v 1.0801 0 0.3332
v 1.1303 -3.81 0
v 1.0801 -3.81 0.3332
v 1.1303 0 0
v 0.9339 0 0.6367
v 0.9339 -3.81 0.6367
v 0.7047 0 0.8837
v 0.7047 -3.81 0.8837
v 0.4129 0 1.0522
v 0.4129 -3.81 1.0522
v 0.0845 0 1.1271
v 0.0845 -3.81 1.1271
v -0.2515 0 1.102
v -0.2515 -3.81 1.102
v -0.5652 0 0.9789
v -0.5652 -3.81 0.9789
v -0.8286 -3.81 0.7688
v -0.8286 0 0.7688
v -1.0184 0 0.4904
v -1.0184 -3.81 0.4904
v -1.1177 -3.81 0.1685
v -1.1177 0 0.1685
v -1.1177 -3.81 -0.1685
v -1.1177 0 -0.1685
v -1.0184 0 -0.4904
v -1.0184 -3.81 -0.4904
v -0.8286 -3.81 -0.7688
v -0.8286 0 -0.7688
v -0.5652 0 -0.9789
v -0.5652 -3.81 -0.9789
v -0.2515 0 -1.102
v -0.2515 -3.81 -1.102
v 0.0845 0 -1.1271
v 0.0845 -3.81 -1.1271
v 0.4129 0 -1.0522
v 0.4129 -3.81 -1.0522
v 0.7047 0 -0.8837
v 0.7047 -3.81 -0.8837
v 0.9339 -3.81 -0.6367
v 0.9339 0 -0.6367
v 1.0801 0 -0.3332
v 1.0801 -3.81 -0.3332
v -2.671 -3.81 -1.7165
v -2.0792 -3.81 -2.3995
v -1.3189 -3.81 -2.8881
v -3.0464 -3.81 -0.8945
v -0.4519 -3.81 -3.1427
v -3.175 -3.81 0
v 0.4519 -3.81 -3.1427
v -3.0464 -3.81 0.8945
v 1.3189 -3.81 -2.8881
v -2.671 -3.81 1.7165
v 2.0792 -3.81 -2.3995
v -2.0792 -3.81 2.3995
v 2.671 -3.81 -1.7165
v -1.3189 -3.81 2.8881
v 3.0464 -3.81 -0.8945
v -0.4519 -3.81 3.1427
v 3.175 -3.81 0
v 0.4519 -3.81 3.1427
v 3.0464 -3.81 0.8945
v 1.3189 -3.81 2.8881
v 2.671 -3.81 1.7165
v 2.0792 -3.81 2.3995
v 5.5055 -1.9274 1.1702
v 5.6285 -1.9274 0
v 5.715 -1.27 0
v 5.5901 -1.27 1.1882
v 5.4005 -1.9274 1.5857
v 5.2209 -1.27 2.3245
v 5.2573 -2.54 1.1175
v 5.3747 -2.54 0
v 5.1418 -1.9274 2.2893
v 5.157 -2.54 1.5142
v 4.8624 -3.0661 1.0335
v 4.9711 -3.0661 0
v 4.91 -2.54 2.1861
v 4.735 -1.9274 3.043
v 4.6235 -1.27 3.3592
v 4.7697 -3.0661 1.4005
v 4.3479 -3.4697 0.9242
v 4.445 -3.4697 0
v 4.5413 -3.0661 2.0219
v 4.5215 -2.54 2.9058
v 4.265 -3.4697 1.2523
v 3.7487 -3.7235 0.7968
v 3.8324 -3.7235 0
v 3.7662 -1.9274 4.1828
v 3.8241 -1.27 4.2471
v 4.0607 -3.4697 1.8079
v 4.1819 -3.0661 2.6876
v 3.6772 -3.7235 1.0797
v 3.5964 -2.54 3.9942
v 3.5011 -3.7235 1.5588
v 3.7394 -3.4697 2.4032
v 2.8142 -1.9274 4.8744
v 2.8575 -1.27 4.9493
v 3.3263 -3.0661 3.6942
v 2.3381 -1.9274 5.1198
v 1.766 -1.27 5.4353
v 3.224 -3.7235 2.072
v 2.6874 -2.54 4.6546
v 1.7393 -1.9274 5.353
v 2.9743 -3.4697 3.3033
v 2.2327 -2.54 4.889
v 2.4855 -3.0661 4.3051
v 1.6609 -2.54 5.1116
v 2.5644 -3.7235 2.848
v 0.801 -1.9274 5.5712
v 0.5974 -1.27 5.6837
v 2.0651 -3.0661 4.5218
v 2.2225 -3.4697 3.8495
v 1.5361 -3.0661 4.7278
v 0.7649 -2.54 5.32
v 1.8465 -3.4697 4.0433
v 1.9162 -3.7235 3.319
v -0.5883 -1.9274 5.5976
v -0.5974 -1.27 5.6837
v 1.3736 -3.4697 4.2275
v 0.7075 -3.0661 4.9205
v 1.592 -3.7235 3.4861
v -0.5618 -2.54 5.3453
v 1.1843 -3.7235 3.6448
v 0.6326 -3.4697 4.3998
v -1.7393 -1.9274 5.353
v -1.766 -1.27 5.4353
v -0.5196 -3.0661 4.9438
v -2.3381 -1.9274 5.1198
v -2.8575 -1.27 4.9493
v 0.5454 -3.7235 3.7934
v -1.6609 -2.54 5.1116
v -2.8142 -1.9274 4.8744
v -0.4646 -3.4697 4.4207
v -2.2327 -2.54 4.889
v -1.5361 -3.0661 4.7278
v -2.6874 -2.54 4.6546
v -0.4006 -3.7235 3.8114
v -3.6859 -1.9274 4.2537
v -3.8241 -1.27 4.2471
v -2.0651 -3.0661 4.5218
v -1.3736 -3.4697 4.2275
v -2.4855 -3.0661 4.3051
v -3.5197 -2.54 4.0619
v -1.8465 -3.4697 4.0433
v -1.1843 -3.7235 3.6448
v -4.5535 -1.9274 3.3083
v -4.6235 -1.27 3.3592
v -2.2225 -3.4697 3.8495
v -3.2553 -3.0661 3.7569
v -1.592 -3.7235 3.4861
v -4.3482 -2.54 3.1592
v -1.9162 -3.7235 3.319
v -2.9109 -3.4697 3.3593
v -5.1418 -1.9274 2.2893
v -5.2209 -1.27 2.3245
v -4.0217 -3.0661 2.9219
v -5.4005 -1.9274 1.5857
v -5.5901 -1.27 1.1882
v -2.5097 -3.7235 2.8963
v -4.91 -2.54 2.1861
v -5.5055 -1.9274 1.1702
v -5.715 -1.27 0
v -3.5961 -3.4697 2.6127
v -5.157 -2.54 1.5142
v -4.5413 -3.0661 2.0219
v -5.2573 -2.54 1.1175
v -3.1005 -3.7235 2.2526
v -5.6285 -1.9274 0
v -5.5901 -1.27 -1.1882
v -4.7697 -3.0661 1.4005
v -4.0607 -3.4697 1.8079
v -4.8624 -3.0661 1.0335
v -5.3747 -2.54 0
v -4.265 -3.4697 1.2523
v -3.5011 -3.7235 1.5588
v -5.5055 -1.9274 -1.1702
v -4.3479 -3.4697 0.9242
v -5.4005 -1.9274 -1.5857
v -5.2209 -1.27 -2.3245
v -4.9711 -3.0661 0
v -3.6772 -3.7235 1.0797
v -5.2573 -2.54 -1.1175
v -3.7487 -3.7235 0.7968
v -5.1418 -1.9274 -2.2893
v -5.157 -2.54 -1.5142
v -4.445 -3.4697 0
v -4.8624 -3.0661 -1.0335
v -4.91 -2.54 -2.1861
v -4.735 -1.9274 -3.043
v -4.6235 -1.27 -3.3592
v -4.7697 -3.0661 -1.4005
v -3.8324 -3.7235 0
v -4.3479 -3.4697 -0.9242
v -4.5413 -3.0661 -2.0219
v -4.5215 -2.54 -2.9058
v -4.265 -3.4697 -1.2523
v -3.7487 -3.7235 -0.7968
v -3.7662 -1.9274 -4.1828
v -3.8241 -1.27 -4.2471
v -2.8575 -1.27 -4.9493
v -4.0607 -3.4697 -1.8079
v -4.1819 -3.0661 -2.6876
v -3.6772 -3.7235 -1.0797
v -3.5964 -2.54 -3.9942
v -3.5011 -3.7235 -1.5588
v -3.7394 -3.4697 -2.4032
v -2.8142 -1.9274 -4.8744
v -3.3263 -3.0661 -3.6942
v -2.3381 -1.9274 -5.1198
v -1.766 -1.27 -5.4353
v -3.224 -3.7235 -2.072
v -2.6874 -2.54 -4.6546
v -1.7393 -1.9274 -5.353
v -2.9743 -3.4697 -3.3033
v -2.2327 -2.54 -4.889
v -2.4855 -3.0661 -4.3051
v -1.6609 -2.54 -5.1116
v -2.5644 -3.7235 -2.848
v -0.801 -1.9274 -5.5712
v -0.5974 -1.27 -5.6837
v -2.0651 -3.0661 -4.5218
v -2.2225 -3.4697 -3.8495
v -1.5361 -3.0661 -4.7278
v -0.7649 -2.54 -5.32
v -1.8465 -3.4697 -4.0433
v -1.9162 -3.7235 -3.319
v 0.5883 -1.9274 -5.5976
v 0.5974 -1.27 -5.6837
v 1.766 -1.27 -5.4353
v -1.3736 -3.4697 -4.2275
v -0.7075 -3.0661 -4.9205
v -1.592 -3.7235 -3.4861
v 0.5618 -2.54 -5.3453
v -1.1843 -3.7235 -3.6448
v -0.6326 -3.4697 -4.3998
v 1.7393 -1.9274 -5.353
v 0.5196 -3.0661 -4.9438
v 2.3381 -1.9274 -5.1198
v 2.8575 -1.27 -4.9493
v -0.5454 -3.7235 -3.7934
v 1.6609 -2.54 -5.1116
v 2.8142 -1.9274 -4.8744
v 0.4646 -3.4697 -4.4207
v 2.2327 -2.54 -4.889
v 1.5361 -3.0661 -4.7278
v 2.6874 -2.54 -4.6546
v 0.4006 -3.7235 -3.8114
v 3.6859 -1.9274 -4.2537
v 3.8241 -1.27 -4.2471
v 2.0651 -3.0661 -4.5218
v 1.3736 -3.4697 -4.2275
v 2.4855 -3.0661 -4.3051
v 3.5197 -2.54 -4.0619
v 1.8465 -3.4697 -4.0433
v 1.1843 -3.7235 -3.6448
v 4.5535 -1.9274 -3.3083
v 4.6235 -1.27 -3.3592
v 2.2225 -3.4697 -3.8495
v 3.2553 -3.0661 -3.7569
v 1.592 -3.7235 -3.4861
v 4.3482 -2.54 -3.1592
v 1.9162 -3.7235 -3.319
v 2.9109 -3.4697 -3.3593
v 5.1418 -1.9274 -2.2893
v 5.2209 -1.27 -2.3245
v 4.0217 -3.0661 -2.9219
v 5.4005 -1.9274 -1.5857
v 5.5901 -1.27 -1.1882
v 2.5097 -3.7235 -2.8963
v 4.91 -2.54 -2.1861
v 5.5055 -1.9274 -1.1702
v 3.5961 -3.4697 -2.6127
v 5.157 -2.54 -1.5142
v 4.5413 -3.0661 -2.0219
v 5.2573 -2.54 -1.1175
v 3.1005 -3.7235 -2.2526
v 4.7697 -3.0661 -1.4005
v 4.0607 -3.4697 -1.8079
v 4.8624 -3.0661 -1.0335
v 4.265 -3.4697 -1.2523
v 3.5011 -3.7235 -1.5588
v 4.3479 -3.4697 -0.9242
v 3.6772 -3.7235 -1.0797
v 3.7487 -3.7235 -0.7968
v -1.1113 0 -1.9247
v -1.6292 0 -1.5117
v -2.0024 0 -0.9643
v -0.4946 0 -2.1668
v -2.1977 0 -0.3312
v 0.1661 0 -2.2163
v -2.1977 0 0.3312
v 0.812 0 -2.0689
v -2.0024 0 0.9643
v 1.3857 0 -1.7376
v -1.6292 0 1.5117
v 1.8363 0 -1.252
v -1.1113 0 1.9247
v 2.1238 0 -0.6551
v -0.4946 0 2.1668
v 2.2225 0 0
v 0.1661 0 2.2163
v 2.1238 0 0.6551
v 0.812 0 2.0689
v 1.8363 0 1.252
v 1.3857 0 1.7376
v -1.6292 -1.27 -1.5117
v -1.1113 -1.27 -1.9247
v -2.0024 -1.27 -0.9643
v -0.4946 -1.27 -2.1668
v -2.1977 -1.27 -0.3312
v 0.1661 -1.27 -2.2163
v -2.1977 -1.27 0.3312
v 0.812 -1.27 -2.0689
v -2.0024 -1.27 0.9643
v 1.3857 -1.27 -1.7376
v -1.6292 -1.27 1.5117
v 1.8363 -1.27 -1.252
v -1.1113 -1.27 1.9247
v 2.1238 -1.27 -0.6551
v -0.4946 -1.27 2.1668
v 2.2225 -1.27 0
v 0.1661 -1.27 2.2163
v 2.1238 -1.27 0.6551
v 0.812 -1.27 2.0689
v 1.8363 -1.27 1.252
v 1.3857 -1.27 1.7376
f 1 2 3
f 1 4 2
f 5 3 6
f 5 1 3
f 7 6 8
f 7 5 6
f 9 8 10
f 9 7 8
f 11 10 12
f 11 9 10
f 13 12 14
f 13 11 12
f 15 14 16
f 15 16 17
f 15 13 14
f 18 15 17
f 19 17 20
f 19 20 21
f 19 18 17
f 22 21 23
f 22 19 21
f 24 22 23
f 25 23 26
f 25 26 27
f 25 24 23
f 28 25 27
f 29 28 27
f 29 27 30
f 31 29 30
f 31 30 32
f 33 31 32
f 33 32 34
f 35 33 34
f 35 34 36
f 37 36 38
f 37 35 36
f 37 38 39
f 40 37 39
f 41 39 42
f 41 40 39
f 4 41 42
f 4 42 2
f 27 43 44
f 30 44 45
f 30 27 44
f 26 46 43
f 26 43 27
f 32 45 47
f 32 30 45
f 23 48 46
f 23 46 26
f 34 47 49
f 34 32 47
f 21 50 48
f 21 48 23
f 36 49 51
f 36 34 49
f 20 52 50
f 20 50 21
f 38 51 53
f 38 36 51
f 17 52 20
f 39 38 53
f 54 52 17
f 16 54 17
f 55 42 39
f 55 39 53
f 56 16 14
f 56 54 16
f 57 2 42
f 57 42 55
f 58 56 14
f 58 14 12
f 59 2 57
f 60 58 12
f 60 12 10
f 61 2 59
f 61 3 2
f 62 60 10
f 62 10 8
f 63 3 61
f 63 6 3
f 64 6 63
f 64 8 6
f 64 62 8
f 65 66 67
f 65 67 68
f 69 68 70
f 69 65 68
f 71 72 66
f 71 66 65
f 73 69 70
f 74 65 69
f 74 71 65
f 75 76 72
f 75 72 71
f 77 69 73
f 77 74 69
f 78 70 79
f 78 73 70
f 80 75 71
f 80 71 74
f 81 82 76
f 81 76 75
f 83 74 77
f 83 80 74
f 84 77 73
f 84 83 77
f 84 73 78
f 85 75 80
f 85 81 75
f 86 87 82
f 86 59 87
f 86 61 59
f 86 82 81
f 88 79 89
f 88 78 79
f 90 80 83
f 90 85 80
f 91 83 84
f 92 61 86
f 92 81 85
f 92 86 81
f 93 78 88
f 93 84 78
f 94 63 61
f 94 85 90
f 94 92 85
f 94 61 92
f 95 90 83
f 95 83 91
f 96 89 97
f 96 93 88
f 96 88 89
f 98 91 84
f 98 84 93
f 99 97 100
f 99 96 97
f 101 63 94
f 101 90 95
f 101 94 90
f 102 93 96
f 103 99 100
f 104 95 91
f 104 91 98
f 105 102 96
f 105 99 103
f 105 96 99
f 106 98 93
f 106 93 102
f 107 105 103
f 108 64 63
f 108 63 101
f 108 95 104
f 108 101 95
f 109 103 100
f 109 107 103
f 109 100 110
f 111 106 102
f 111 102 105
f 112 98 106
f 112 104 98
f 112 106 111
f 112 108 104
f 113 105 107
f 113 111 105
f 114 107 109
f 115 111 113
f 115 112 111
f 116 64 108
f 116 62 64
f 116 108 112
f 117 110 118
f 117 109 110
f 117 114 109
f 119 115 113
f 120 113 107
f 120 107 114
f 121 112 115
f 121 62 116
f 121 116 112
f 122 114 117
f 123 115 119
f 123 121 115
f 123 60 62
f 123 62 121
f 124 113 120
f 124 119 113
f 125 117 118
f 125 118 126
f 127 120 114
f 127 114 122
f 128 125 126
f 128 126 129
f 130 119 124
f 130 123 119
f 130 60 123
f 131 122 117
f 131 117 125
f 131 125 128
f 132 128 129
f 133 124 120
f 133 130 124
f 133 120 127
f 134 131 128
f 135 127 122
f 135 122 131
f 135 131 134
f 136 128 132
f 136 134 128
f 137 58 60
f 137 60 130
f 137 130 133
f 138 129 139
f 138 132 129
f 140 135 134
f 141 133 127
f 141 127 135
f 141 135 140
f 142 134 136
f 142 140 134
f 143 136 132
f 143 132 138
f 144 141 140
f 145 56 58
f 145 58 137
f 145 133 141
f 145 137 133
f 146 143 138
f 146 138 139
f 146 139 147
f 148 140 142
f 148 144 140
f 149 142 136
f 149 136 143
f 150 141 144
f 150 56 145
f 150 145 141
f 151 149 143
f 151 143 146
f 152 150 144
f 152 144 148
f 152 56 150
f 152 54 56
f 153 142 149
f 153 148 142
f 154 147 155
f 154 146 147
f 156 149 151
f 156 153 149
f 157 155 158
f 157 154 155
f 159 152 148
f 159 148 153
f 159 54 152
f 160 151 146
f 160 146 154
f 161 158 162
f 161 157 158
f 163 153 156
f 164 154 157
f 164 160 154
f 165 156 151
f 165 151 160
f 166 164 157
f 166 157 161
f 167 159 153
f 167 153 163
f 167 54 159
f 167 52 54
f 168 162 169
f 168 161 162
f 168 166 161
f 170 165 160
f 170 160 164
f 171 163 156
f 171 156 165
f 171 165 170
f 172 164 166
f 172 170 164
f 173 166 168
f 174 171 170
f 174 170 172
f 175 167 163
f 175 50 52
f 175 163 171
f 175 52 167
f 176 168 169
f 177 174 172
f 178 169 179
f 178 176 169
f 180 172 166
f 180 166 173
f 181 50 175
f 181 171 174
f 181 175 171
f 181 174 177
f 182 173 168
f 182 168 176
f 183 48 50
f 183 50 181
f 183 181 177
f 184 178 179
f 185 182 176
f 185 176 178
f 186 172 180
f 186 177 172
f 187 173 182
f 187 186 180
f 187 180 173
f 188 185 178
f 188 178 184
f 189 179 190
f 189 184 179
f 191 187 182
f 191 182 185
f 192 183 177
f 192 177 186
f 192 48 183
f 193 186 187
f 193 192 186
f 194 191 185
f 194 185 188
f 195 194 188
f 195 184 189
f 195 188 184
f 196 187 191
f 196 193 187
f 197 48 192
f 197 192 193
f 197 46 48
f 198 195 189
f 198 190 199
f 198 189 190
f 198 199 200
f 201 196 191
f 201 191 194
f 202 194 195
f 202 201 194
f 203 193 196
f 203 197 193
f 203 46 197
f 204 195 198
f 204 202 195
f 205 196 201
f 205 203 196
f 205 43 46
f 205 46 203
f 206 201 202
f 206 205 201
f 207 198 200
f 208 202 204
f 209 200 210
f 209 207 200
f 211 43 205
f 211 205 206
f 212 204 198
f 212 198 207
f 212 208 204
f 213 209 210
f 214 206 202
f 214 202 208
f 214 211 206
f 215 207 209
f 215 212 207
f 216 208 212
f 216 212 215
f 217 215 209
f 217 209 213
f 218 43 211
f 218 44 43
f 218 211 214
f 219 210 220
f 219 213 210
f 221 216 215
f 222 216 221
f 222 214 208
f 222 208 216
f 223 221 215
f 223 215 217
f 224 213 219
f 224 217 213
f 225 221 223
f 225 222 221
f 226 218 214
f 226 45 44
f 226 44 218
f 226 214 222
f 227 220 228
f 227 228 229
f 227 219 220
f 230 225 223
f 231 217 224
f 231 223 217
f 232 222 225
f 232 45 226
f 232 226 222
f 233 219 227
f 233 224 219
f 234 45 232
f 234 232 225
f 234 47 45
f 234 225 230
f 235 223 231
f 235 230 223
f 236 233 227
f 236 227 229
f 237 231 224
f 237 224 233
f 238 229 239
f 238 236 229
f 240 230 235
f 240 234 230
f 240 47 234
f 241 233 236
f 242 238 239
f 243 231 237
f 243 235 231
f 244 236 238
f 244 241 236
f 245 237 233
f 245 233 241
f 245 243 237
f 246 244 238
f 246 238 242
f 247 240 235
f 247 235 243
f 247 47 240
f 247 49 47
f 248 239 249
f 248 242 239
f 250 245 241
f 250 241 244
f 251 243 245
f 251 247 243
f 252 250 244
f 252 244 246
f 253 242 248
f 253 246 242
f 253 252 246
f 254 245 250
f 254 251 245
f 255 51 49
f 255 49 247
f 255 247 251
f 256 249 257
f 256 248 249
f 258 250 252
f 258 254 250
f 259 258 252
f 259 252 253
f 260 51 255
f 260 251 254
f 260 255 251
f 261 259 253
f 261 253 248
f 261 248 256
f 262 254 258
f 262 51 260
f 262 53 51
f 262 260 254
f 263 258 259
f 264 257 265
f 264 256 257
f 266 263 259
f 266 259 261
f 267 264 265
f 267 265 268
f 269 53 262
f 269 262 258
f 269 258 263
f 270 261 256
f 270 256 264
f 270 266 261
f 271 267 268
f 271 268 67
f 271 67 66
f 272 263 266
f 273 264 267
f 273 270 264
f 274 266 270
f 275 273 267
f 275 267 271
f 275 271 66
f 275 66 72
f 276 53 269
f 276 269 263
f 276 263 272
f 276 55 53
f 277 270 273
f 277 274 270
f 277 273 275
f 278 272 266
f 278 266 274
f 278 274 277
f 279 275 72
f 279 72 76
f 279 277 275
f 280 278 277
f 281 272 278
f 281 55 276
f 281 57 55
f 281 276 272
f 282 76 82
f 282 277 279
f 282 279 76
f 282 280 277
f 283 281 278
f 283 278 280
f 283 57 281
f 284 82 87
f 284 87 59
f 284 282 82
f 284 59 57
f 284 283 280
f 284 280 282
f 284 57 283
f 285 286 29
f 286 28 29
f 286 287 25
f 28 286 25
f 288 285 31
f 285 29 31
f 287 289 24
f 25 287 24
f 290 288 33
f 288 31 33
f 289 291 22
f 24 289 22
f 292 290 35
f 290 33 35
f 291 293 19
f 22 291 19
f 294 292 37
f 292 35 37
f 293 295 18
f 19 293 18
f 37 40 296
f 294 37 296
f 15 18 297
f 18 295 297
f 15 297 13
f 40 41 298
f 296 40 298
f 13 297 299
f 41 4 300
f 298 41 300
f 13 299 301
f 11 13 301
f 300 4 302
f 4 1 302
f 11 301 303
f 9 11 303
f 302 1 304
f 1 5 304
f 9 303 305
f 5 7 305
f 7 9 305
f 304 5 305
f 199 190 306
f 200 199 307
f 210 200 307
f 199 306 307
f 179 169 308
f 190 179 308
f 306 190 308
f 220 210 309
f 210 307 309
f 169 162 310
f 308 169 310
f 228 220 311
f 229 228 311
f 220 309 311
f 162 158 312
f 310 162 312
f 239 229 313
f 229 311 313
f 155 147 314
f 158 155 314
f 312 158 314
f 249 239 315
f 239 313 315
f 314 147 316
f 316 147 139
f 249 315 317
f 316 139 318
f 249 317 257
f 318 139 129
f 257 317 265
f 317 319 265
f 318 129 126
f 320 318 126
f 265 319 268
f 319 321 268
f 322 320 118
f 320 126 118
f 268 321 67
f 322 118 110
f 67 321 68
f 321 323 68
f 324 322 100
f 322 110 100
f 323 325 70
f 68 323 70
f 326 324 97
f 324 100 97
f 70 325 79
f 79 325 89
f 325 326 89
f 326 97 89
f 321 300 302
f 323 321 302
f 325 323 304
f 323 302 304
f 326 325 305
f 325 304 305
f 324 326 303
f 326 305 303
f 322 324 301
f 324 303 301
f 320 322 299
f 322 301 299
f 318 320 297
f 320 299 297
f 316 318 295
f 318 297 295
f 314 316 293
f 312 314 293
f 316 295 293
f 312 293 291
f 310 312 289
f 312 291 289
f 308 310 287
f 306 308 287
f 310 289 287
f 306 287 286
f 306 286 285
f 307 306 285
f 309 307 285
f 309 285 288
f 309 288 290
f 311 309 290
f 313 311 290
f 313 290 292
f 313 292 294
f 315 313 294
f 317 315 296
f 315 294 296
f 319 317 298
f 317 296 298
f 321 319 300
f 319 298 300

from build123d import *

# Parameters (mm, degrees)
F0_R     = 2.2225
F0_R_2   = 1.1303
F1_DEPTH = 1.27
F2_R     = 5.715
F2_R_2   = 2.2225
F2_R_3   = 1.1303
F3_DEPTH = 2.54
F4_R     = 2.53999


# Not quite as in the source:
# - a fillet or chamfer is up to 0.001 mm smaller than in the source, because OpenCascade refuses the exact size
# - a feature of the source that left no trace in its solid (it failed there, or was rolled back) is left out


with BuildPart() as f1:
    # F0 (on Front) → F1 (new body)
    with BuildSketch(Plane.XZ):
        Circle(F0_R)
        Circle(F0_R_2, mode=Mode.SUBTRACT)
    extrude(amount=F1_DEPTH)

    # F2 (on face) → F3 (join)
    with BuildSketch(Plane.XZ.offset(1.27)):
        Circle(F2_R)
        Circle(F2_R_2, mode=Mode.SUBTRACT)
        Circle(F2_R_2)
        Circle(F2_R_3, mode=Mode.SUBTRACT)
    extrude(amount=F3_DEPTH)

    # F4 (radius 2.54 in the source; OpenCascade refuses exactly that, so slightly less here)
    f4_edges = [f1.edges().sort_by_distance(p)[0] for p in [
        (-5.715, -3.81, 0),
    ]]
    fillet(f4_edges, radius=F4_R)


solid = f1.part
